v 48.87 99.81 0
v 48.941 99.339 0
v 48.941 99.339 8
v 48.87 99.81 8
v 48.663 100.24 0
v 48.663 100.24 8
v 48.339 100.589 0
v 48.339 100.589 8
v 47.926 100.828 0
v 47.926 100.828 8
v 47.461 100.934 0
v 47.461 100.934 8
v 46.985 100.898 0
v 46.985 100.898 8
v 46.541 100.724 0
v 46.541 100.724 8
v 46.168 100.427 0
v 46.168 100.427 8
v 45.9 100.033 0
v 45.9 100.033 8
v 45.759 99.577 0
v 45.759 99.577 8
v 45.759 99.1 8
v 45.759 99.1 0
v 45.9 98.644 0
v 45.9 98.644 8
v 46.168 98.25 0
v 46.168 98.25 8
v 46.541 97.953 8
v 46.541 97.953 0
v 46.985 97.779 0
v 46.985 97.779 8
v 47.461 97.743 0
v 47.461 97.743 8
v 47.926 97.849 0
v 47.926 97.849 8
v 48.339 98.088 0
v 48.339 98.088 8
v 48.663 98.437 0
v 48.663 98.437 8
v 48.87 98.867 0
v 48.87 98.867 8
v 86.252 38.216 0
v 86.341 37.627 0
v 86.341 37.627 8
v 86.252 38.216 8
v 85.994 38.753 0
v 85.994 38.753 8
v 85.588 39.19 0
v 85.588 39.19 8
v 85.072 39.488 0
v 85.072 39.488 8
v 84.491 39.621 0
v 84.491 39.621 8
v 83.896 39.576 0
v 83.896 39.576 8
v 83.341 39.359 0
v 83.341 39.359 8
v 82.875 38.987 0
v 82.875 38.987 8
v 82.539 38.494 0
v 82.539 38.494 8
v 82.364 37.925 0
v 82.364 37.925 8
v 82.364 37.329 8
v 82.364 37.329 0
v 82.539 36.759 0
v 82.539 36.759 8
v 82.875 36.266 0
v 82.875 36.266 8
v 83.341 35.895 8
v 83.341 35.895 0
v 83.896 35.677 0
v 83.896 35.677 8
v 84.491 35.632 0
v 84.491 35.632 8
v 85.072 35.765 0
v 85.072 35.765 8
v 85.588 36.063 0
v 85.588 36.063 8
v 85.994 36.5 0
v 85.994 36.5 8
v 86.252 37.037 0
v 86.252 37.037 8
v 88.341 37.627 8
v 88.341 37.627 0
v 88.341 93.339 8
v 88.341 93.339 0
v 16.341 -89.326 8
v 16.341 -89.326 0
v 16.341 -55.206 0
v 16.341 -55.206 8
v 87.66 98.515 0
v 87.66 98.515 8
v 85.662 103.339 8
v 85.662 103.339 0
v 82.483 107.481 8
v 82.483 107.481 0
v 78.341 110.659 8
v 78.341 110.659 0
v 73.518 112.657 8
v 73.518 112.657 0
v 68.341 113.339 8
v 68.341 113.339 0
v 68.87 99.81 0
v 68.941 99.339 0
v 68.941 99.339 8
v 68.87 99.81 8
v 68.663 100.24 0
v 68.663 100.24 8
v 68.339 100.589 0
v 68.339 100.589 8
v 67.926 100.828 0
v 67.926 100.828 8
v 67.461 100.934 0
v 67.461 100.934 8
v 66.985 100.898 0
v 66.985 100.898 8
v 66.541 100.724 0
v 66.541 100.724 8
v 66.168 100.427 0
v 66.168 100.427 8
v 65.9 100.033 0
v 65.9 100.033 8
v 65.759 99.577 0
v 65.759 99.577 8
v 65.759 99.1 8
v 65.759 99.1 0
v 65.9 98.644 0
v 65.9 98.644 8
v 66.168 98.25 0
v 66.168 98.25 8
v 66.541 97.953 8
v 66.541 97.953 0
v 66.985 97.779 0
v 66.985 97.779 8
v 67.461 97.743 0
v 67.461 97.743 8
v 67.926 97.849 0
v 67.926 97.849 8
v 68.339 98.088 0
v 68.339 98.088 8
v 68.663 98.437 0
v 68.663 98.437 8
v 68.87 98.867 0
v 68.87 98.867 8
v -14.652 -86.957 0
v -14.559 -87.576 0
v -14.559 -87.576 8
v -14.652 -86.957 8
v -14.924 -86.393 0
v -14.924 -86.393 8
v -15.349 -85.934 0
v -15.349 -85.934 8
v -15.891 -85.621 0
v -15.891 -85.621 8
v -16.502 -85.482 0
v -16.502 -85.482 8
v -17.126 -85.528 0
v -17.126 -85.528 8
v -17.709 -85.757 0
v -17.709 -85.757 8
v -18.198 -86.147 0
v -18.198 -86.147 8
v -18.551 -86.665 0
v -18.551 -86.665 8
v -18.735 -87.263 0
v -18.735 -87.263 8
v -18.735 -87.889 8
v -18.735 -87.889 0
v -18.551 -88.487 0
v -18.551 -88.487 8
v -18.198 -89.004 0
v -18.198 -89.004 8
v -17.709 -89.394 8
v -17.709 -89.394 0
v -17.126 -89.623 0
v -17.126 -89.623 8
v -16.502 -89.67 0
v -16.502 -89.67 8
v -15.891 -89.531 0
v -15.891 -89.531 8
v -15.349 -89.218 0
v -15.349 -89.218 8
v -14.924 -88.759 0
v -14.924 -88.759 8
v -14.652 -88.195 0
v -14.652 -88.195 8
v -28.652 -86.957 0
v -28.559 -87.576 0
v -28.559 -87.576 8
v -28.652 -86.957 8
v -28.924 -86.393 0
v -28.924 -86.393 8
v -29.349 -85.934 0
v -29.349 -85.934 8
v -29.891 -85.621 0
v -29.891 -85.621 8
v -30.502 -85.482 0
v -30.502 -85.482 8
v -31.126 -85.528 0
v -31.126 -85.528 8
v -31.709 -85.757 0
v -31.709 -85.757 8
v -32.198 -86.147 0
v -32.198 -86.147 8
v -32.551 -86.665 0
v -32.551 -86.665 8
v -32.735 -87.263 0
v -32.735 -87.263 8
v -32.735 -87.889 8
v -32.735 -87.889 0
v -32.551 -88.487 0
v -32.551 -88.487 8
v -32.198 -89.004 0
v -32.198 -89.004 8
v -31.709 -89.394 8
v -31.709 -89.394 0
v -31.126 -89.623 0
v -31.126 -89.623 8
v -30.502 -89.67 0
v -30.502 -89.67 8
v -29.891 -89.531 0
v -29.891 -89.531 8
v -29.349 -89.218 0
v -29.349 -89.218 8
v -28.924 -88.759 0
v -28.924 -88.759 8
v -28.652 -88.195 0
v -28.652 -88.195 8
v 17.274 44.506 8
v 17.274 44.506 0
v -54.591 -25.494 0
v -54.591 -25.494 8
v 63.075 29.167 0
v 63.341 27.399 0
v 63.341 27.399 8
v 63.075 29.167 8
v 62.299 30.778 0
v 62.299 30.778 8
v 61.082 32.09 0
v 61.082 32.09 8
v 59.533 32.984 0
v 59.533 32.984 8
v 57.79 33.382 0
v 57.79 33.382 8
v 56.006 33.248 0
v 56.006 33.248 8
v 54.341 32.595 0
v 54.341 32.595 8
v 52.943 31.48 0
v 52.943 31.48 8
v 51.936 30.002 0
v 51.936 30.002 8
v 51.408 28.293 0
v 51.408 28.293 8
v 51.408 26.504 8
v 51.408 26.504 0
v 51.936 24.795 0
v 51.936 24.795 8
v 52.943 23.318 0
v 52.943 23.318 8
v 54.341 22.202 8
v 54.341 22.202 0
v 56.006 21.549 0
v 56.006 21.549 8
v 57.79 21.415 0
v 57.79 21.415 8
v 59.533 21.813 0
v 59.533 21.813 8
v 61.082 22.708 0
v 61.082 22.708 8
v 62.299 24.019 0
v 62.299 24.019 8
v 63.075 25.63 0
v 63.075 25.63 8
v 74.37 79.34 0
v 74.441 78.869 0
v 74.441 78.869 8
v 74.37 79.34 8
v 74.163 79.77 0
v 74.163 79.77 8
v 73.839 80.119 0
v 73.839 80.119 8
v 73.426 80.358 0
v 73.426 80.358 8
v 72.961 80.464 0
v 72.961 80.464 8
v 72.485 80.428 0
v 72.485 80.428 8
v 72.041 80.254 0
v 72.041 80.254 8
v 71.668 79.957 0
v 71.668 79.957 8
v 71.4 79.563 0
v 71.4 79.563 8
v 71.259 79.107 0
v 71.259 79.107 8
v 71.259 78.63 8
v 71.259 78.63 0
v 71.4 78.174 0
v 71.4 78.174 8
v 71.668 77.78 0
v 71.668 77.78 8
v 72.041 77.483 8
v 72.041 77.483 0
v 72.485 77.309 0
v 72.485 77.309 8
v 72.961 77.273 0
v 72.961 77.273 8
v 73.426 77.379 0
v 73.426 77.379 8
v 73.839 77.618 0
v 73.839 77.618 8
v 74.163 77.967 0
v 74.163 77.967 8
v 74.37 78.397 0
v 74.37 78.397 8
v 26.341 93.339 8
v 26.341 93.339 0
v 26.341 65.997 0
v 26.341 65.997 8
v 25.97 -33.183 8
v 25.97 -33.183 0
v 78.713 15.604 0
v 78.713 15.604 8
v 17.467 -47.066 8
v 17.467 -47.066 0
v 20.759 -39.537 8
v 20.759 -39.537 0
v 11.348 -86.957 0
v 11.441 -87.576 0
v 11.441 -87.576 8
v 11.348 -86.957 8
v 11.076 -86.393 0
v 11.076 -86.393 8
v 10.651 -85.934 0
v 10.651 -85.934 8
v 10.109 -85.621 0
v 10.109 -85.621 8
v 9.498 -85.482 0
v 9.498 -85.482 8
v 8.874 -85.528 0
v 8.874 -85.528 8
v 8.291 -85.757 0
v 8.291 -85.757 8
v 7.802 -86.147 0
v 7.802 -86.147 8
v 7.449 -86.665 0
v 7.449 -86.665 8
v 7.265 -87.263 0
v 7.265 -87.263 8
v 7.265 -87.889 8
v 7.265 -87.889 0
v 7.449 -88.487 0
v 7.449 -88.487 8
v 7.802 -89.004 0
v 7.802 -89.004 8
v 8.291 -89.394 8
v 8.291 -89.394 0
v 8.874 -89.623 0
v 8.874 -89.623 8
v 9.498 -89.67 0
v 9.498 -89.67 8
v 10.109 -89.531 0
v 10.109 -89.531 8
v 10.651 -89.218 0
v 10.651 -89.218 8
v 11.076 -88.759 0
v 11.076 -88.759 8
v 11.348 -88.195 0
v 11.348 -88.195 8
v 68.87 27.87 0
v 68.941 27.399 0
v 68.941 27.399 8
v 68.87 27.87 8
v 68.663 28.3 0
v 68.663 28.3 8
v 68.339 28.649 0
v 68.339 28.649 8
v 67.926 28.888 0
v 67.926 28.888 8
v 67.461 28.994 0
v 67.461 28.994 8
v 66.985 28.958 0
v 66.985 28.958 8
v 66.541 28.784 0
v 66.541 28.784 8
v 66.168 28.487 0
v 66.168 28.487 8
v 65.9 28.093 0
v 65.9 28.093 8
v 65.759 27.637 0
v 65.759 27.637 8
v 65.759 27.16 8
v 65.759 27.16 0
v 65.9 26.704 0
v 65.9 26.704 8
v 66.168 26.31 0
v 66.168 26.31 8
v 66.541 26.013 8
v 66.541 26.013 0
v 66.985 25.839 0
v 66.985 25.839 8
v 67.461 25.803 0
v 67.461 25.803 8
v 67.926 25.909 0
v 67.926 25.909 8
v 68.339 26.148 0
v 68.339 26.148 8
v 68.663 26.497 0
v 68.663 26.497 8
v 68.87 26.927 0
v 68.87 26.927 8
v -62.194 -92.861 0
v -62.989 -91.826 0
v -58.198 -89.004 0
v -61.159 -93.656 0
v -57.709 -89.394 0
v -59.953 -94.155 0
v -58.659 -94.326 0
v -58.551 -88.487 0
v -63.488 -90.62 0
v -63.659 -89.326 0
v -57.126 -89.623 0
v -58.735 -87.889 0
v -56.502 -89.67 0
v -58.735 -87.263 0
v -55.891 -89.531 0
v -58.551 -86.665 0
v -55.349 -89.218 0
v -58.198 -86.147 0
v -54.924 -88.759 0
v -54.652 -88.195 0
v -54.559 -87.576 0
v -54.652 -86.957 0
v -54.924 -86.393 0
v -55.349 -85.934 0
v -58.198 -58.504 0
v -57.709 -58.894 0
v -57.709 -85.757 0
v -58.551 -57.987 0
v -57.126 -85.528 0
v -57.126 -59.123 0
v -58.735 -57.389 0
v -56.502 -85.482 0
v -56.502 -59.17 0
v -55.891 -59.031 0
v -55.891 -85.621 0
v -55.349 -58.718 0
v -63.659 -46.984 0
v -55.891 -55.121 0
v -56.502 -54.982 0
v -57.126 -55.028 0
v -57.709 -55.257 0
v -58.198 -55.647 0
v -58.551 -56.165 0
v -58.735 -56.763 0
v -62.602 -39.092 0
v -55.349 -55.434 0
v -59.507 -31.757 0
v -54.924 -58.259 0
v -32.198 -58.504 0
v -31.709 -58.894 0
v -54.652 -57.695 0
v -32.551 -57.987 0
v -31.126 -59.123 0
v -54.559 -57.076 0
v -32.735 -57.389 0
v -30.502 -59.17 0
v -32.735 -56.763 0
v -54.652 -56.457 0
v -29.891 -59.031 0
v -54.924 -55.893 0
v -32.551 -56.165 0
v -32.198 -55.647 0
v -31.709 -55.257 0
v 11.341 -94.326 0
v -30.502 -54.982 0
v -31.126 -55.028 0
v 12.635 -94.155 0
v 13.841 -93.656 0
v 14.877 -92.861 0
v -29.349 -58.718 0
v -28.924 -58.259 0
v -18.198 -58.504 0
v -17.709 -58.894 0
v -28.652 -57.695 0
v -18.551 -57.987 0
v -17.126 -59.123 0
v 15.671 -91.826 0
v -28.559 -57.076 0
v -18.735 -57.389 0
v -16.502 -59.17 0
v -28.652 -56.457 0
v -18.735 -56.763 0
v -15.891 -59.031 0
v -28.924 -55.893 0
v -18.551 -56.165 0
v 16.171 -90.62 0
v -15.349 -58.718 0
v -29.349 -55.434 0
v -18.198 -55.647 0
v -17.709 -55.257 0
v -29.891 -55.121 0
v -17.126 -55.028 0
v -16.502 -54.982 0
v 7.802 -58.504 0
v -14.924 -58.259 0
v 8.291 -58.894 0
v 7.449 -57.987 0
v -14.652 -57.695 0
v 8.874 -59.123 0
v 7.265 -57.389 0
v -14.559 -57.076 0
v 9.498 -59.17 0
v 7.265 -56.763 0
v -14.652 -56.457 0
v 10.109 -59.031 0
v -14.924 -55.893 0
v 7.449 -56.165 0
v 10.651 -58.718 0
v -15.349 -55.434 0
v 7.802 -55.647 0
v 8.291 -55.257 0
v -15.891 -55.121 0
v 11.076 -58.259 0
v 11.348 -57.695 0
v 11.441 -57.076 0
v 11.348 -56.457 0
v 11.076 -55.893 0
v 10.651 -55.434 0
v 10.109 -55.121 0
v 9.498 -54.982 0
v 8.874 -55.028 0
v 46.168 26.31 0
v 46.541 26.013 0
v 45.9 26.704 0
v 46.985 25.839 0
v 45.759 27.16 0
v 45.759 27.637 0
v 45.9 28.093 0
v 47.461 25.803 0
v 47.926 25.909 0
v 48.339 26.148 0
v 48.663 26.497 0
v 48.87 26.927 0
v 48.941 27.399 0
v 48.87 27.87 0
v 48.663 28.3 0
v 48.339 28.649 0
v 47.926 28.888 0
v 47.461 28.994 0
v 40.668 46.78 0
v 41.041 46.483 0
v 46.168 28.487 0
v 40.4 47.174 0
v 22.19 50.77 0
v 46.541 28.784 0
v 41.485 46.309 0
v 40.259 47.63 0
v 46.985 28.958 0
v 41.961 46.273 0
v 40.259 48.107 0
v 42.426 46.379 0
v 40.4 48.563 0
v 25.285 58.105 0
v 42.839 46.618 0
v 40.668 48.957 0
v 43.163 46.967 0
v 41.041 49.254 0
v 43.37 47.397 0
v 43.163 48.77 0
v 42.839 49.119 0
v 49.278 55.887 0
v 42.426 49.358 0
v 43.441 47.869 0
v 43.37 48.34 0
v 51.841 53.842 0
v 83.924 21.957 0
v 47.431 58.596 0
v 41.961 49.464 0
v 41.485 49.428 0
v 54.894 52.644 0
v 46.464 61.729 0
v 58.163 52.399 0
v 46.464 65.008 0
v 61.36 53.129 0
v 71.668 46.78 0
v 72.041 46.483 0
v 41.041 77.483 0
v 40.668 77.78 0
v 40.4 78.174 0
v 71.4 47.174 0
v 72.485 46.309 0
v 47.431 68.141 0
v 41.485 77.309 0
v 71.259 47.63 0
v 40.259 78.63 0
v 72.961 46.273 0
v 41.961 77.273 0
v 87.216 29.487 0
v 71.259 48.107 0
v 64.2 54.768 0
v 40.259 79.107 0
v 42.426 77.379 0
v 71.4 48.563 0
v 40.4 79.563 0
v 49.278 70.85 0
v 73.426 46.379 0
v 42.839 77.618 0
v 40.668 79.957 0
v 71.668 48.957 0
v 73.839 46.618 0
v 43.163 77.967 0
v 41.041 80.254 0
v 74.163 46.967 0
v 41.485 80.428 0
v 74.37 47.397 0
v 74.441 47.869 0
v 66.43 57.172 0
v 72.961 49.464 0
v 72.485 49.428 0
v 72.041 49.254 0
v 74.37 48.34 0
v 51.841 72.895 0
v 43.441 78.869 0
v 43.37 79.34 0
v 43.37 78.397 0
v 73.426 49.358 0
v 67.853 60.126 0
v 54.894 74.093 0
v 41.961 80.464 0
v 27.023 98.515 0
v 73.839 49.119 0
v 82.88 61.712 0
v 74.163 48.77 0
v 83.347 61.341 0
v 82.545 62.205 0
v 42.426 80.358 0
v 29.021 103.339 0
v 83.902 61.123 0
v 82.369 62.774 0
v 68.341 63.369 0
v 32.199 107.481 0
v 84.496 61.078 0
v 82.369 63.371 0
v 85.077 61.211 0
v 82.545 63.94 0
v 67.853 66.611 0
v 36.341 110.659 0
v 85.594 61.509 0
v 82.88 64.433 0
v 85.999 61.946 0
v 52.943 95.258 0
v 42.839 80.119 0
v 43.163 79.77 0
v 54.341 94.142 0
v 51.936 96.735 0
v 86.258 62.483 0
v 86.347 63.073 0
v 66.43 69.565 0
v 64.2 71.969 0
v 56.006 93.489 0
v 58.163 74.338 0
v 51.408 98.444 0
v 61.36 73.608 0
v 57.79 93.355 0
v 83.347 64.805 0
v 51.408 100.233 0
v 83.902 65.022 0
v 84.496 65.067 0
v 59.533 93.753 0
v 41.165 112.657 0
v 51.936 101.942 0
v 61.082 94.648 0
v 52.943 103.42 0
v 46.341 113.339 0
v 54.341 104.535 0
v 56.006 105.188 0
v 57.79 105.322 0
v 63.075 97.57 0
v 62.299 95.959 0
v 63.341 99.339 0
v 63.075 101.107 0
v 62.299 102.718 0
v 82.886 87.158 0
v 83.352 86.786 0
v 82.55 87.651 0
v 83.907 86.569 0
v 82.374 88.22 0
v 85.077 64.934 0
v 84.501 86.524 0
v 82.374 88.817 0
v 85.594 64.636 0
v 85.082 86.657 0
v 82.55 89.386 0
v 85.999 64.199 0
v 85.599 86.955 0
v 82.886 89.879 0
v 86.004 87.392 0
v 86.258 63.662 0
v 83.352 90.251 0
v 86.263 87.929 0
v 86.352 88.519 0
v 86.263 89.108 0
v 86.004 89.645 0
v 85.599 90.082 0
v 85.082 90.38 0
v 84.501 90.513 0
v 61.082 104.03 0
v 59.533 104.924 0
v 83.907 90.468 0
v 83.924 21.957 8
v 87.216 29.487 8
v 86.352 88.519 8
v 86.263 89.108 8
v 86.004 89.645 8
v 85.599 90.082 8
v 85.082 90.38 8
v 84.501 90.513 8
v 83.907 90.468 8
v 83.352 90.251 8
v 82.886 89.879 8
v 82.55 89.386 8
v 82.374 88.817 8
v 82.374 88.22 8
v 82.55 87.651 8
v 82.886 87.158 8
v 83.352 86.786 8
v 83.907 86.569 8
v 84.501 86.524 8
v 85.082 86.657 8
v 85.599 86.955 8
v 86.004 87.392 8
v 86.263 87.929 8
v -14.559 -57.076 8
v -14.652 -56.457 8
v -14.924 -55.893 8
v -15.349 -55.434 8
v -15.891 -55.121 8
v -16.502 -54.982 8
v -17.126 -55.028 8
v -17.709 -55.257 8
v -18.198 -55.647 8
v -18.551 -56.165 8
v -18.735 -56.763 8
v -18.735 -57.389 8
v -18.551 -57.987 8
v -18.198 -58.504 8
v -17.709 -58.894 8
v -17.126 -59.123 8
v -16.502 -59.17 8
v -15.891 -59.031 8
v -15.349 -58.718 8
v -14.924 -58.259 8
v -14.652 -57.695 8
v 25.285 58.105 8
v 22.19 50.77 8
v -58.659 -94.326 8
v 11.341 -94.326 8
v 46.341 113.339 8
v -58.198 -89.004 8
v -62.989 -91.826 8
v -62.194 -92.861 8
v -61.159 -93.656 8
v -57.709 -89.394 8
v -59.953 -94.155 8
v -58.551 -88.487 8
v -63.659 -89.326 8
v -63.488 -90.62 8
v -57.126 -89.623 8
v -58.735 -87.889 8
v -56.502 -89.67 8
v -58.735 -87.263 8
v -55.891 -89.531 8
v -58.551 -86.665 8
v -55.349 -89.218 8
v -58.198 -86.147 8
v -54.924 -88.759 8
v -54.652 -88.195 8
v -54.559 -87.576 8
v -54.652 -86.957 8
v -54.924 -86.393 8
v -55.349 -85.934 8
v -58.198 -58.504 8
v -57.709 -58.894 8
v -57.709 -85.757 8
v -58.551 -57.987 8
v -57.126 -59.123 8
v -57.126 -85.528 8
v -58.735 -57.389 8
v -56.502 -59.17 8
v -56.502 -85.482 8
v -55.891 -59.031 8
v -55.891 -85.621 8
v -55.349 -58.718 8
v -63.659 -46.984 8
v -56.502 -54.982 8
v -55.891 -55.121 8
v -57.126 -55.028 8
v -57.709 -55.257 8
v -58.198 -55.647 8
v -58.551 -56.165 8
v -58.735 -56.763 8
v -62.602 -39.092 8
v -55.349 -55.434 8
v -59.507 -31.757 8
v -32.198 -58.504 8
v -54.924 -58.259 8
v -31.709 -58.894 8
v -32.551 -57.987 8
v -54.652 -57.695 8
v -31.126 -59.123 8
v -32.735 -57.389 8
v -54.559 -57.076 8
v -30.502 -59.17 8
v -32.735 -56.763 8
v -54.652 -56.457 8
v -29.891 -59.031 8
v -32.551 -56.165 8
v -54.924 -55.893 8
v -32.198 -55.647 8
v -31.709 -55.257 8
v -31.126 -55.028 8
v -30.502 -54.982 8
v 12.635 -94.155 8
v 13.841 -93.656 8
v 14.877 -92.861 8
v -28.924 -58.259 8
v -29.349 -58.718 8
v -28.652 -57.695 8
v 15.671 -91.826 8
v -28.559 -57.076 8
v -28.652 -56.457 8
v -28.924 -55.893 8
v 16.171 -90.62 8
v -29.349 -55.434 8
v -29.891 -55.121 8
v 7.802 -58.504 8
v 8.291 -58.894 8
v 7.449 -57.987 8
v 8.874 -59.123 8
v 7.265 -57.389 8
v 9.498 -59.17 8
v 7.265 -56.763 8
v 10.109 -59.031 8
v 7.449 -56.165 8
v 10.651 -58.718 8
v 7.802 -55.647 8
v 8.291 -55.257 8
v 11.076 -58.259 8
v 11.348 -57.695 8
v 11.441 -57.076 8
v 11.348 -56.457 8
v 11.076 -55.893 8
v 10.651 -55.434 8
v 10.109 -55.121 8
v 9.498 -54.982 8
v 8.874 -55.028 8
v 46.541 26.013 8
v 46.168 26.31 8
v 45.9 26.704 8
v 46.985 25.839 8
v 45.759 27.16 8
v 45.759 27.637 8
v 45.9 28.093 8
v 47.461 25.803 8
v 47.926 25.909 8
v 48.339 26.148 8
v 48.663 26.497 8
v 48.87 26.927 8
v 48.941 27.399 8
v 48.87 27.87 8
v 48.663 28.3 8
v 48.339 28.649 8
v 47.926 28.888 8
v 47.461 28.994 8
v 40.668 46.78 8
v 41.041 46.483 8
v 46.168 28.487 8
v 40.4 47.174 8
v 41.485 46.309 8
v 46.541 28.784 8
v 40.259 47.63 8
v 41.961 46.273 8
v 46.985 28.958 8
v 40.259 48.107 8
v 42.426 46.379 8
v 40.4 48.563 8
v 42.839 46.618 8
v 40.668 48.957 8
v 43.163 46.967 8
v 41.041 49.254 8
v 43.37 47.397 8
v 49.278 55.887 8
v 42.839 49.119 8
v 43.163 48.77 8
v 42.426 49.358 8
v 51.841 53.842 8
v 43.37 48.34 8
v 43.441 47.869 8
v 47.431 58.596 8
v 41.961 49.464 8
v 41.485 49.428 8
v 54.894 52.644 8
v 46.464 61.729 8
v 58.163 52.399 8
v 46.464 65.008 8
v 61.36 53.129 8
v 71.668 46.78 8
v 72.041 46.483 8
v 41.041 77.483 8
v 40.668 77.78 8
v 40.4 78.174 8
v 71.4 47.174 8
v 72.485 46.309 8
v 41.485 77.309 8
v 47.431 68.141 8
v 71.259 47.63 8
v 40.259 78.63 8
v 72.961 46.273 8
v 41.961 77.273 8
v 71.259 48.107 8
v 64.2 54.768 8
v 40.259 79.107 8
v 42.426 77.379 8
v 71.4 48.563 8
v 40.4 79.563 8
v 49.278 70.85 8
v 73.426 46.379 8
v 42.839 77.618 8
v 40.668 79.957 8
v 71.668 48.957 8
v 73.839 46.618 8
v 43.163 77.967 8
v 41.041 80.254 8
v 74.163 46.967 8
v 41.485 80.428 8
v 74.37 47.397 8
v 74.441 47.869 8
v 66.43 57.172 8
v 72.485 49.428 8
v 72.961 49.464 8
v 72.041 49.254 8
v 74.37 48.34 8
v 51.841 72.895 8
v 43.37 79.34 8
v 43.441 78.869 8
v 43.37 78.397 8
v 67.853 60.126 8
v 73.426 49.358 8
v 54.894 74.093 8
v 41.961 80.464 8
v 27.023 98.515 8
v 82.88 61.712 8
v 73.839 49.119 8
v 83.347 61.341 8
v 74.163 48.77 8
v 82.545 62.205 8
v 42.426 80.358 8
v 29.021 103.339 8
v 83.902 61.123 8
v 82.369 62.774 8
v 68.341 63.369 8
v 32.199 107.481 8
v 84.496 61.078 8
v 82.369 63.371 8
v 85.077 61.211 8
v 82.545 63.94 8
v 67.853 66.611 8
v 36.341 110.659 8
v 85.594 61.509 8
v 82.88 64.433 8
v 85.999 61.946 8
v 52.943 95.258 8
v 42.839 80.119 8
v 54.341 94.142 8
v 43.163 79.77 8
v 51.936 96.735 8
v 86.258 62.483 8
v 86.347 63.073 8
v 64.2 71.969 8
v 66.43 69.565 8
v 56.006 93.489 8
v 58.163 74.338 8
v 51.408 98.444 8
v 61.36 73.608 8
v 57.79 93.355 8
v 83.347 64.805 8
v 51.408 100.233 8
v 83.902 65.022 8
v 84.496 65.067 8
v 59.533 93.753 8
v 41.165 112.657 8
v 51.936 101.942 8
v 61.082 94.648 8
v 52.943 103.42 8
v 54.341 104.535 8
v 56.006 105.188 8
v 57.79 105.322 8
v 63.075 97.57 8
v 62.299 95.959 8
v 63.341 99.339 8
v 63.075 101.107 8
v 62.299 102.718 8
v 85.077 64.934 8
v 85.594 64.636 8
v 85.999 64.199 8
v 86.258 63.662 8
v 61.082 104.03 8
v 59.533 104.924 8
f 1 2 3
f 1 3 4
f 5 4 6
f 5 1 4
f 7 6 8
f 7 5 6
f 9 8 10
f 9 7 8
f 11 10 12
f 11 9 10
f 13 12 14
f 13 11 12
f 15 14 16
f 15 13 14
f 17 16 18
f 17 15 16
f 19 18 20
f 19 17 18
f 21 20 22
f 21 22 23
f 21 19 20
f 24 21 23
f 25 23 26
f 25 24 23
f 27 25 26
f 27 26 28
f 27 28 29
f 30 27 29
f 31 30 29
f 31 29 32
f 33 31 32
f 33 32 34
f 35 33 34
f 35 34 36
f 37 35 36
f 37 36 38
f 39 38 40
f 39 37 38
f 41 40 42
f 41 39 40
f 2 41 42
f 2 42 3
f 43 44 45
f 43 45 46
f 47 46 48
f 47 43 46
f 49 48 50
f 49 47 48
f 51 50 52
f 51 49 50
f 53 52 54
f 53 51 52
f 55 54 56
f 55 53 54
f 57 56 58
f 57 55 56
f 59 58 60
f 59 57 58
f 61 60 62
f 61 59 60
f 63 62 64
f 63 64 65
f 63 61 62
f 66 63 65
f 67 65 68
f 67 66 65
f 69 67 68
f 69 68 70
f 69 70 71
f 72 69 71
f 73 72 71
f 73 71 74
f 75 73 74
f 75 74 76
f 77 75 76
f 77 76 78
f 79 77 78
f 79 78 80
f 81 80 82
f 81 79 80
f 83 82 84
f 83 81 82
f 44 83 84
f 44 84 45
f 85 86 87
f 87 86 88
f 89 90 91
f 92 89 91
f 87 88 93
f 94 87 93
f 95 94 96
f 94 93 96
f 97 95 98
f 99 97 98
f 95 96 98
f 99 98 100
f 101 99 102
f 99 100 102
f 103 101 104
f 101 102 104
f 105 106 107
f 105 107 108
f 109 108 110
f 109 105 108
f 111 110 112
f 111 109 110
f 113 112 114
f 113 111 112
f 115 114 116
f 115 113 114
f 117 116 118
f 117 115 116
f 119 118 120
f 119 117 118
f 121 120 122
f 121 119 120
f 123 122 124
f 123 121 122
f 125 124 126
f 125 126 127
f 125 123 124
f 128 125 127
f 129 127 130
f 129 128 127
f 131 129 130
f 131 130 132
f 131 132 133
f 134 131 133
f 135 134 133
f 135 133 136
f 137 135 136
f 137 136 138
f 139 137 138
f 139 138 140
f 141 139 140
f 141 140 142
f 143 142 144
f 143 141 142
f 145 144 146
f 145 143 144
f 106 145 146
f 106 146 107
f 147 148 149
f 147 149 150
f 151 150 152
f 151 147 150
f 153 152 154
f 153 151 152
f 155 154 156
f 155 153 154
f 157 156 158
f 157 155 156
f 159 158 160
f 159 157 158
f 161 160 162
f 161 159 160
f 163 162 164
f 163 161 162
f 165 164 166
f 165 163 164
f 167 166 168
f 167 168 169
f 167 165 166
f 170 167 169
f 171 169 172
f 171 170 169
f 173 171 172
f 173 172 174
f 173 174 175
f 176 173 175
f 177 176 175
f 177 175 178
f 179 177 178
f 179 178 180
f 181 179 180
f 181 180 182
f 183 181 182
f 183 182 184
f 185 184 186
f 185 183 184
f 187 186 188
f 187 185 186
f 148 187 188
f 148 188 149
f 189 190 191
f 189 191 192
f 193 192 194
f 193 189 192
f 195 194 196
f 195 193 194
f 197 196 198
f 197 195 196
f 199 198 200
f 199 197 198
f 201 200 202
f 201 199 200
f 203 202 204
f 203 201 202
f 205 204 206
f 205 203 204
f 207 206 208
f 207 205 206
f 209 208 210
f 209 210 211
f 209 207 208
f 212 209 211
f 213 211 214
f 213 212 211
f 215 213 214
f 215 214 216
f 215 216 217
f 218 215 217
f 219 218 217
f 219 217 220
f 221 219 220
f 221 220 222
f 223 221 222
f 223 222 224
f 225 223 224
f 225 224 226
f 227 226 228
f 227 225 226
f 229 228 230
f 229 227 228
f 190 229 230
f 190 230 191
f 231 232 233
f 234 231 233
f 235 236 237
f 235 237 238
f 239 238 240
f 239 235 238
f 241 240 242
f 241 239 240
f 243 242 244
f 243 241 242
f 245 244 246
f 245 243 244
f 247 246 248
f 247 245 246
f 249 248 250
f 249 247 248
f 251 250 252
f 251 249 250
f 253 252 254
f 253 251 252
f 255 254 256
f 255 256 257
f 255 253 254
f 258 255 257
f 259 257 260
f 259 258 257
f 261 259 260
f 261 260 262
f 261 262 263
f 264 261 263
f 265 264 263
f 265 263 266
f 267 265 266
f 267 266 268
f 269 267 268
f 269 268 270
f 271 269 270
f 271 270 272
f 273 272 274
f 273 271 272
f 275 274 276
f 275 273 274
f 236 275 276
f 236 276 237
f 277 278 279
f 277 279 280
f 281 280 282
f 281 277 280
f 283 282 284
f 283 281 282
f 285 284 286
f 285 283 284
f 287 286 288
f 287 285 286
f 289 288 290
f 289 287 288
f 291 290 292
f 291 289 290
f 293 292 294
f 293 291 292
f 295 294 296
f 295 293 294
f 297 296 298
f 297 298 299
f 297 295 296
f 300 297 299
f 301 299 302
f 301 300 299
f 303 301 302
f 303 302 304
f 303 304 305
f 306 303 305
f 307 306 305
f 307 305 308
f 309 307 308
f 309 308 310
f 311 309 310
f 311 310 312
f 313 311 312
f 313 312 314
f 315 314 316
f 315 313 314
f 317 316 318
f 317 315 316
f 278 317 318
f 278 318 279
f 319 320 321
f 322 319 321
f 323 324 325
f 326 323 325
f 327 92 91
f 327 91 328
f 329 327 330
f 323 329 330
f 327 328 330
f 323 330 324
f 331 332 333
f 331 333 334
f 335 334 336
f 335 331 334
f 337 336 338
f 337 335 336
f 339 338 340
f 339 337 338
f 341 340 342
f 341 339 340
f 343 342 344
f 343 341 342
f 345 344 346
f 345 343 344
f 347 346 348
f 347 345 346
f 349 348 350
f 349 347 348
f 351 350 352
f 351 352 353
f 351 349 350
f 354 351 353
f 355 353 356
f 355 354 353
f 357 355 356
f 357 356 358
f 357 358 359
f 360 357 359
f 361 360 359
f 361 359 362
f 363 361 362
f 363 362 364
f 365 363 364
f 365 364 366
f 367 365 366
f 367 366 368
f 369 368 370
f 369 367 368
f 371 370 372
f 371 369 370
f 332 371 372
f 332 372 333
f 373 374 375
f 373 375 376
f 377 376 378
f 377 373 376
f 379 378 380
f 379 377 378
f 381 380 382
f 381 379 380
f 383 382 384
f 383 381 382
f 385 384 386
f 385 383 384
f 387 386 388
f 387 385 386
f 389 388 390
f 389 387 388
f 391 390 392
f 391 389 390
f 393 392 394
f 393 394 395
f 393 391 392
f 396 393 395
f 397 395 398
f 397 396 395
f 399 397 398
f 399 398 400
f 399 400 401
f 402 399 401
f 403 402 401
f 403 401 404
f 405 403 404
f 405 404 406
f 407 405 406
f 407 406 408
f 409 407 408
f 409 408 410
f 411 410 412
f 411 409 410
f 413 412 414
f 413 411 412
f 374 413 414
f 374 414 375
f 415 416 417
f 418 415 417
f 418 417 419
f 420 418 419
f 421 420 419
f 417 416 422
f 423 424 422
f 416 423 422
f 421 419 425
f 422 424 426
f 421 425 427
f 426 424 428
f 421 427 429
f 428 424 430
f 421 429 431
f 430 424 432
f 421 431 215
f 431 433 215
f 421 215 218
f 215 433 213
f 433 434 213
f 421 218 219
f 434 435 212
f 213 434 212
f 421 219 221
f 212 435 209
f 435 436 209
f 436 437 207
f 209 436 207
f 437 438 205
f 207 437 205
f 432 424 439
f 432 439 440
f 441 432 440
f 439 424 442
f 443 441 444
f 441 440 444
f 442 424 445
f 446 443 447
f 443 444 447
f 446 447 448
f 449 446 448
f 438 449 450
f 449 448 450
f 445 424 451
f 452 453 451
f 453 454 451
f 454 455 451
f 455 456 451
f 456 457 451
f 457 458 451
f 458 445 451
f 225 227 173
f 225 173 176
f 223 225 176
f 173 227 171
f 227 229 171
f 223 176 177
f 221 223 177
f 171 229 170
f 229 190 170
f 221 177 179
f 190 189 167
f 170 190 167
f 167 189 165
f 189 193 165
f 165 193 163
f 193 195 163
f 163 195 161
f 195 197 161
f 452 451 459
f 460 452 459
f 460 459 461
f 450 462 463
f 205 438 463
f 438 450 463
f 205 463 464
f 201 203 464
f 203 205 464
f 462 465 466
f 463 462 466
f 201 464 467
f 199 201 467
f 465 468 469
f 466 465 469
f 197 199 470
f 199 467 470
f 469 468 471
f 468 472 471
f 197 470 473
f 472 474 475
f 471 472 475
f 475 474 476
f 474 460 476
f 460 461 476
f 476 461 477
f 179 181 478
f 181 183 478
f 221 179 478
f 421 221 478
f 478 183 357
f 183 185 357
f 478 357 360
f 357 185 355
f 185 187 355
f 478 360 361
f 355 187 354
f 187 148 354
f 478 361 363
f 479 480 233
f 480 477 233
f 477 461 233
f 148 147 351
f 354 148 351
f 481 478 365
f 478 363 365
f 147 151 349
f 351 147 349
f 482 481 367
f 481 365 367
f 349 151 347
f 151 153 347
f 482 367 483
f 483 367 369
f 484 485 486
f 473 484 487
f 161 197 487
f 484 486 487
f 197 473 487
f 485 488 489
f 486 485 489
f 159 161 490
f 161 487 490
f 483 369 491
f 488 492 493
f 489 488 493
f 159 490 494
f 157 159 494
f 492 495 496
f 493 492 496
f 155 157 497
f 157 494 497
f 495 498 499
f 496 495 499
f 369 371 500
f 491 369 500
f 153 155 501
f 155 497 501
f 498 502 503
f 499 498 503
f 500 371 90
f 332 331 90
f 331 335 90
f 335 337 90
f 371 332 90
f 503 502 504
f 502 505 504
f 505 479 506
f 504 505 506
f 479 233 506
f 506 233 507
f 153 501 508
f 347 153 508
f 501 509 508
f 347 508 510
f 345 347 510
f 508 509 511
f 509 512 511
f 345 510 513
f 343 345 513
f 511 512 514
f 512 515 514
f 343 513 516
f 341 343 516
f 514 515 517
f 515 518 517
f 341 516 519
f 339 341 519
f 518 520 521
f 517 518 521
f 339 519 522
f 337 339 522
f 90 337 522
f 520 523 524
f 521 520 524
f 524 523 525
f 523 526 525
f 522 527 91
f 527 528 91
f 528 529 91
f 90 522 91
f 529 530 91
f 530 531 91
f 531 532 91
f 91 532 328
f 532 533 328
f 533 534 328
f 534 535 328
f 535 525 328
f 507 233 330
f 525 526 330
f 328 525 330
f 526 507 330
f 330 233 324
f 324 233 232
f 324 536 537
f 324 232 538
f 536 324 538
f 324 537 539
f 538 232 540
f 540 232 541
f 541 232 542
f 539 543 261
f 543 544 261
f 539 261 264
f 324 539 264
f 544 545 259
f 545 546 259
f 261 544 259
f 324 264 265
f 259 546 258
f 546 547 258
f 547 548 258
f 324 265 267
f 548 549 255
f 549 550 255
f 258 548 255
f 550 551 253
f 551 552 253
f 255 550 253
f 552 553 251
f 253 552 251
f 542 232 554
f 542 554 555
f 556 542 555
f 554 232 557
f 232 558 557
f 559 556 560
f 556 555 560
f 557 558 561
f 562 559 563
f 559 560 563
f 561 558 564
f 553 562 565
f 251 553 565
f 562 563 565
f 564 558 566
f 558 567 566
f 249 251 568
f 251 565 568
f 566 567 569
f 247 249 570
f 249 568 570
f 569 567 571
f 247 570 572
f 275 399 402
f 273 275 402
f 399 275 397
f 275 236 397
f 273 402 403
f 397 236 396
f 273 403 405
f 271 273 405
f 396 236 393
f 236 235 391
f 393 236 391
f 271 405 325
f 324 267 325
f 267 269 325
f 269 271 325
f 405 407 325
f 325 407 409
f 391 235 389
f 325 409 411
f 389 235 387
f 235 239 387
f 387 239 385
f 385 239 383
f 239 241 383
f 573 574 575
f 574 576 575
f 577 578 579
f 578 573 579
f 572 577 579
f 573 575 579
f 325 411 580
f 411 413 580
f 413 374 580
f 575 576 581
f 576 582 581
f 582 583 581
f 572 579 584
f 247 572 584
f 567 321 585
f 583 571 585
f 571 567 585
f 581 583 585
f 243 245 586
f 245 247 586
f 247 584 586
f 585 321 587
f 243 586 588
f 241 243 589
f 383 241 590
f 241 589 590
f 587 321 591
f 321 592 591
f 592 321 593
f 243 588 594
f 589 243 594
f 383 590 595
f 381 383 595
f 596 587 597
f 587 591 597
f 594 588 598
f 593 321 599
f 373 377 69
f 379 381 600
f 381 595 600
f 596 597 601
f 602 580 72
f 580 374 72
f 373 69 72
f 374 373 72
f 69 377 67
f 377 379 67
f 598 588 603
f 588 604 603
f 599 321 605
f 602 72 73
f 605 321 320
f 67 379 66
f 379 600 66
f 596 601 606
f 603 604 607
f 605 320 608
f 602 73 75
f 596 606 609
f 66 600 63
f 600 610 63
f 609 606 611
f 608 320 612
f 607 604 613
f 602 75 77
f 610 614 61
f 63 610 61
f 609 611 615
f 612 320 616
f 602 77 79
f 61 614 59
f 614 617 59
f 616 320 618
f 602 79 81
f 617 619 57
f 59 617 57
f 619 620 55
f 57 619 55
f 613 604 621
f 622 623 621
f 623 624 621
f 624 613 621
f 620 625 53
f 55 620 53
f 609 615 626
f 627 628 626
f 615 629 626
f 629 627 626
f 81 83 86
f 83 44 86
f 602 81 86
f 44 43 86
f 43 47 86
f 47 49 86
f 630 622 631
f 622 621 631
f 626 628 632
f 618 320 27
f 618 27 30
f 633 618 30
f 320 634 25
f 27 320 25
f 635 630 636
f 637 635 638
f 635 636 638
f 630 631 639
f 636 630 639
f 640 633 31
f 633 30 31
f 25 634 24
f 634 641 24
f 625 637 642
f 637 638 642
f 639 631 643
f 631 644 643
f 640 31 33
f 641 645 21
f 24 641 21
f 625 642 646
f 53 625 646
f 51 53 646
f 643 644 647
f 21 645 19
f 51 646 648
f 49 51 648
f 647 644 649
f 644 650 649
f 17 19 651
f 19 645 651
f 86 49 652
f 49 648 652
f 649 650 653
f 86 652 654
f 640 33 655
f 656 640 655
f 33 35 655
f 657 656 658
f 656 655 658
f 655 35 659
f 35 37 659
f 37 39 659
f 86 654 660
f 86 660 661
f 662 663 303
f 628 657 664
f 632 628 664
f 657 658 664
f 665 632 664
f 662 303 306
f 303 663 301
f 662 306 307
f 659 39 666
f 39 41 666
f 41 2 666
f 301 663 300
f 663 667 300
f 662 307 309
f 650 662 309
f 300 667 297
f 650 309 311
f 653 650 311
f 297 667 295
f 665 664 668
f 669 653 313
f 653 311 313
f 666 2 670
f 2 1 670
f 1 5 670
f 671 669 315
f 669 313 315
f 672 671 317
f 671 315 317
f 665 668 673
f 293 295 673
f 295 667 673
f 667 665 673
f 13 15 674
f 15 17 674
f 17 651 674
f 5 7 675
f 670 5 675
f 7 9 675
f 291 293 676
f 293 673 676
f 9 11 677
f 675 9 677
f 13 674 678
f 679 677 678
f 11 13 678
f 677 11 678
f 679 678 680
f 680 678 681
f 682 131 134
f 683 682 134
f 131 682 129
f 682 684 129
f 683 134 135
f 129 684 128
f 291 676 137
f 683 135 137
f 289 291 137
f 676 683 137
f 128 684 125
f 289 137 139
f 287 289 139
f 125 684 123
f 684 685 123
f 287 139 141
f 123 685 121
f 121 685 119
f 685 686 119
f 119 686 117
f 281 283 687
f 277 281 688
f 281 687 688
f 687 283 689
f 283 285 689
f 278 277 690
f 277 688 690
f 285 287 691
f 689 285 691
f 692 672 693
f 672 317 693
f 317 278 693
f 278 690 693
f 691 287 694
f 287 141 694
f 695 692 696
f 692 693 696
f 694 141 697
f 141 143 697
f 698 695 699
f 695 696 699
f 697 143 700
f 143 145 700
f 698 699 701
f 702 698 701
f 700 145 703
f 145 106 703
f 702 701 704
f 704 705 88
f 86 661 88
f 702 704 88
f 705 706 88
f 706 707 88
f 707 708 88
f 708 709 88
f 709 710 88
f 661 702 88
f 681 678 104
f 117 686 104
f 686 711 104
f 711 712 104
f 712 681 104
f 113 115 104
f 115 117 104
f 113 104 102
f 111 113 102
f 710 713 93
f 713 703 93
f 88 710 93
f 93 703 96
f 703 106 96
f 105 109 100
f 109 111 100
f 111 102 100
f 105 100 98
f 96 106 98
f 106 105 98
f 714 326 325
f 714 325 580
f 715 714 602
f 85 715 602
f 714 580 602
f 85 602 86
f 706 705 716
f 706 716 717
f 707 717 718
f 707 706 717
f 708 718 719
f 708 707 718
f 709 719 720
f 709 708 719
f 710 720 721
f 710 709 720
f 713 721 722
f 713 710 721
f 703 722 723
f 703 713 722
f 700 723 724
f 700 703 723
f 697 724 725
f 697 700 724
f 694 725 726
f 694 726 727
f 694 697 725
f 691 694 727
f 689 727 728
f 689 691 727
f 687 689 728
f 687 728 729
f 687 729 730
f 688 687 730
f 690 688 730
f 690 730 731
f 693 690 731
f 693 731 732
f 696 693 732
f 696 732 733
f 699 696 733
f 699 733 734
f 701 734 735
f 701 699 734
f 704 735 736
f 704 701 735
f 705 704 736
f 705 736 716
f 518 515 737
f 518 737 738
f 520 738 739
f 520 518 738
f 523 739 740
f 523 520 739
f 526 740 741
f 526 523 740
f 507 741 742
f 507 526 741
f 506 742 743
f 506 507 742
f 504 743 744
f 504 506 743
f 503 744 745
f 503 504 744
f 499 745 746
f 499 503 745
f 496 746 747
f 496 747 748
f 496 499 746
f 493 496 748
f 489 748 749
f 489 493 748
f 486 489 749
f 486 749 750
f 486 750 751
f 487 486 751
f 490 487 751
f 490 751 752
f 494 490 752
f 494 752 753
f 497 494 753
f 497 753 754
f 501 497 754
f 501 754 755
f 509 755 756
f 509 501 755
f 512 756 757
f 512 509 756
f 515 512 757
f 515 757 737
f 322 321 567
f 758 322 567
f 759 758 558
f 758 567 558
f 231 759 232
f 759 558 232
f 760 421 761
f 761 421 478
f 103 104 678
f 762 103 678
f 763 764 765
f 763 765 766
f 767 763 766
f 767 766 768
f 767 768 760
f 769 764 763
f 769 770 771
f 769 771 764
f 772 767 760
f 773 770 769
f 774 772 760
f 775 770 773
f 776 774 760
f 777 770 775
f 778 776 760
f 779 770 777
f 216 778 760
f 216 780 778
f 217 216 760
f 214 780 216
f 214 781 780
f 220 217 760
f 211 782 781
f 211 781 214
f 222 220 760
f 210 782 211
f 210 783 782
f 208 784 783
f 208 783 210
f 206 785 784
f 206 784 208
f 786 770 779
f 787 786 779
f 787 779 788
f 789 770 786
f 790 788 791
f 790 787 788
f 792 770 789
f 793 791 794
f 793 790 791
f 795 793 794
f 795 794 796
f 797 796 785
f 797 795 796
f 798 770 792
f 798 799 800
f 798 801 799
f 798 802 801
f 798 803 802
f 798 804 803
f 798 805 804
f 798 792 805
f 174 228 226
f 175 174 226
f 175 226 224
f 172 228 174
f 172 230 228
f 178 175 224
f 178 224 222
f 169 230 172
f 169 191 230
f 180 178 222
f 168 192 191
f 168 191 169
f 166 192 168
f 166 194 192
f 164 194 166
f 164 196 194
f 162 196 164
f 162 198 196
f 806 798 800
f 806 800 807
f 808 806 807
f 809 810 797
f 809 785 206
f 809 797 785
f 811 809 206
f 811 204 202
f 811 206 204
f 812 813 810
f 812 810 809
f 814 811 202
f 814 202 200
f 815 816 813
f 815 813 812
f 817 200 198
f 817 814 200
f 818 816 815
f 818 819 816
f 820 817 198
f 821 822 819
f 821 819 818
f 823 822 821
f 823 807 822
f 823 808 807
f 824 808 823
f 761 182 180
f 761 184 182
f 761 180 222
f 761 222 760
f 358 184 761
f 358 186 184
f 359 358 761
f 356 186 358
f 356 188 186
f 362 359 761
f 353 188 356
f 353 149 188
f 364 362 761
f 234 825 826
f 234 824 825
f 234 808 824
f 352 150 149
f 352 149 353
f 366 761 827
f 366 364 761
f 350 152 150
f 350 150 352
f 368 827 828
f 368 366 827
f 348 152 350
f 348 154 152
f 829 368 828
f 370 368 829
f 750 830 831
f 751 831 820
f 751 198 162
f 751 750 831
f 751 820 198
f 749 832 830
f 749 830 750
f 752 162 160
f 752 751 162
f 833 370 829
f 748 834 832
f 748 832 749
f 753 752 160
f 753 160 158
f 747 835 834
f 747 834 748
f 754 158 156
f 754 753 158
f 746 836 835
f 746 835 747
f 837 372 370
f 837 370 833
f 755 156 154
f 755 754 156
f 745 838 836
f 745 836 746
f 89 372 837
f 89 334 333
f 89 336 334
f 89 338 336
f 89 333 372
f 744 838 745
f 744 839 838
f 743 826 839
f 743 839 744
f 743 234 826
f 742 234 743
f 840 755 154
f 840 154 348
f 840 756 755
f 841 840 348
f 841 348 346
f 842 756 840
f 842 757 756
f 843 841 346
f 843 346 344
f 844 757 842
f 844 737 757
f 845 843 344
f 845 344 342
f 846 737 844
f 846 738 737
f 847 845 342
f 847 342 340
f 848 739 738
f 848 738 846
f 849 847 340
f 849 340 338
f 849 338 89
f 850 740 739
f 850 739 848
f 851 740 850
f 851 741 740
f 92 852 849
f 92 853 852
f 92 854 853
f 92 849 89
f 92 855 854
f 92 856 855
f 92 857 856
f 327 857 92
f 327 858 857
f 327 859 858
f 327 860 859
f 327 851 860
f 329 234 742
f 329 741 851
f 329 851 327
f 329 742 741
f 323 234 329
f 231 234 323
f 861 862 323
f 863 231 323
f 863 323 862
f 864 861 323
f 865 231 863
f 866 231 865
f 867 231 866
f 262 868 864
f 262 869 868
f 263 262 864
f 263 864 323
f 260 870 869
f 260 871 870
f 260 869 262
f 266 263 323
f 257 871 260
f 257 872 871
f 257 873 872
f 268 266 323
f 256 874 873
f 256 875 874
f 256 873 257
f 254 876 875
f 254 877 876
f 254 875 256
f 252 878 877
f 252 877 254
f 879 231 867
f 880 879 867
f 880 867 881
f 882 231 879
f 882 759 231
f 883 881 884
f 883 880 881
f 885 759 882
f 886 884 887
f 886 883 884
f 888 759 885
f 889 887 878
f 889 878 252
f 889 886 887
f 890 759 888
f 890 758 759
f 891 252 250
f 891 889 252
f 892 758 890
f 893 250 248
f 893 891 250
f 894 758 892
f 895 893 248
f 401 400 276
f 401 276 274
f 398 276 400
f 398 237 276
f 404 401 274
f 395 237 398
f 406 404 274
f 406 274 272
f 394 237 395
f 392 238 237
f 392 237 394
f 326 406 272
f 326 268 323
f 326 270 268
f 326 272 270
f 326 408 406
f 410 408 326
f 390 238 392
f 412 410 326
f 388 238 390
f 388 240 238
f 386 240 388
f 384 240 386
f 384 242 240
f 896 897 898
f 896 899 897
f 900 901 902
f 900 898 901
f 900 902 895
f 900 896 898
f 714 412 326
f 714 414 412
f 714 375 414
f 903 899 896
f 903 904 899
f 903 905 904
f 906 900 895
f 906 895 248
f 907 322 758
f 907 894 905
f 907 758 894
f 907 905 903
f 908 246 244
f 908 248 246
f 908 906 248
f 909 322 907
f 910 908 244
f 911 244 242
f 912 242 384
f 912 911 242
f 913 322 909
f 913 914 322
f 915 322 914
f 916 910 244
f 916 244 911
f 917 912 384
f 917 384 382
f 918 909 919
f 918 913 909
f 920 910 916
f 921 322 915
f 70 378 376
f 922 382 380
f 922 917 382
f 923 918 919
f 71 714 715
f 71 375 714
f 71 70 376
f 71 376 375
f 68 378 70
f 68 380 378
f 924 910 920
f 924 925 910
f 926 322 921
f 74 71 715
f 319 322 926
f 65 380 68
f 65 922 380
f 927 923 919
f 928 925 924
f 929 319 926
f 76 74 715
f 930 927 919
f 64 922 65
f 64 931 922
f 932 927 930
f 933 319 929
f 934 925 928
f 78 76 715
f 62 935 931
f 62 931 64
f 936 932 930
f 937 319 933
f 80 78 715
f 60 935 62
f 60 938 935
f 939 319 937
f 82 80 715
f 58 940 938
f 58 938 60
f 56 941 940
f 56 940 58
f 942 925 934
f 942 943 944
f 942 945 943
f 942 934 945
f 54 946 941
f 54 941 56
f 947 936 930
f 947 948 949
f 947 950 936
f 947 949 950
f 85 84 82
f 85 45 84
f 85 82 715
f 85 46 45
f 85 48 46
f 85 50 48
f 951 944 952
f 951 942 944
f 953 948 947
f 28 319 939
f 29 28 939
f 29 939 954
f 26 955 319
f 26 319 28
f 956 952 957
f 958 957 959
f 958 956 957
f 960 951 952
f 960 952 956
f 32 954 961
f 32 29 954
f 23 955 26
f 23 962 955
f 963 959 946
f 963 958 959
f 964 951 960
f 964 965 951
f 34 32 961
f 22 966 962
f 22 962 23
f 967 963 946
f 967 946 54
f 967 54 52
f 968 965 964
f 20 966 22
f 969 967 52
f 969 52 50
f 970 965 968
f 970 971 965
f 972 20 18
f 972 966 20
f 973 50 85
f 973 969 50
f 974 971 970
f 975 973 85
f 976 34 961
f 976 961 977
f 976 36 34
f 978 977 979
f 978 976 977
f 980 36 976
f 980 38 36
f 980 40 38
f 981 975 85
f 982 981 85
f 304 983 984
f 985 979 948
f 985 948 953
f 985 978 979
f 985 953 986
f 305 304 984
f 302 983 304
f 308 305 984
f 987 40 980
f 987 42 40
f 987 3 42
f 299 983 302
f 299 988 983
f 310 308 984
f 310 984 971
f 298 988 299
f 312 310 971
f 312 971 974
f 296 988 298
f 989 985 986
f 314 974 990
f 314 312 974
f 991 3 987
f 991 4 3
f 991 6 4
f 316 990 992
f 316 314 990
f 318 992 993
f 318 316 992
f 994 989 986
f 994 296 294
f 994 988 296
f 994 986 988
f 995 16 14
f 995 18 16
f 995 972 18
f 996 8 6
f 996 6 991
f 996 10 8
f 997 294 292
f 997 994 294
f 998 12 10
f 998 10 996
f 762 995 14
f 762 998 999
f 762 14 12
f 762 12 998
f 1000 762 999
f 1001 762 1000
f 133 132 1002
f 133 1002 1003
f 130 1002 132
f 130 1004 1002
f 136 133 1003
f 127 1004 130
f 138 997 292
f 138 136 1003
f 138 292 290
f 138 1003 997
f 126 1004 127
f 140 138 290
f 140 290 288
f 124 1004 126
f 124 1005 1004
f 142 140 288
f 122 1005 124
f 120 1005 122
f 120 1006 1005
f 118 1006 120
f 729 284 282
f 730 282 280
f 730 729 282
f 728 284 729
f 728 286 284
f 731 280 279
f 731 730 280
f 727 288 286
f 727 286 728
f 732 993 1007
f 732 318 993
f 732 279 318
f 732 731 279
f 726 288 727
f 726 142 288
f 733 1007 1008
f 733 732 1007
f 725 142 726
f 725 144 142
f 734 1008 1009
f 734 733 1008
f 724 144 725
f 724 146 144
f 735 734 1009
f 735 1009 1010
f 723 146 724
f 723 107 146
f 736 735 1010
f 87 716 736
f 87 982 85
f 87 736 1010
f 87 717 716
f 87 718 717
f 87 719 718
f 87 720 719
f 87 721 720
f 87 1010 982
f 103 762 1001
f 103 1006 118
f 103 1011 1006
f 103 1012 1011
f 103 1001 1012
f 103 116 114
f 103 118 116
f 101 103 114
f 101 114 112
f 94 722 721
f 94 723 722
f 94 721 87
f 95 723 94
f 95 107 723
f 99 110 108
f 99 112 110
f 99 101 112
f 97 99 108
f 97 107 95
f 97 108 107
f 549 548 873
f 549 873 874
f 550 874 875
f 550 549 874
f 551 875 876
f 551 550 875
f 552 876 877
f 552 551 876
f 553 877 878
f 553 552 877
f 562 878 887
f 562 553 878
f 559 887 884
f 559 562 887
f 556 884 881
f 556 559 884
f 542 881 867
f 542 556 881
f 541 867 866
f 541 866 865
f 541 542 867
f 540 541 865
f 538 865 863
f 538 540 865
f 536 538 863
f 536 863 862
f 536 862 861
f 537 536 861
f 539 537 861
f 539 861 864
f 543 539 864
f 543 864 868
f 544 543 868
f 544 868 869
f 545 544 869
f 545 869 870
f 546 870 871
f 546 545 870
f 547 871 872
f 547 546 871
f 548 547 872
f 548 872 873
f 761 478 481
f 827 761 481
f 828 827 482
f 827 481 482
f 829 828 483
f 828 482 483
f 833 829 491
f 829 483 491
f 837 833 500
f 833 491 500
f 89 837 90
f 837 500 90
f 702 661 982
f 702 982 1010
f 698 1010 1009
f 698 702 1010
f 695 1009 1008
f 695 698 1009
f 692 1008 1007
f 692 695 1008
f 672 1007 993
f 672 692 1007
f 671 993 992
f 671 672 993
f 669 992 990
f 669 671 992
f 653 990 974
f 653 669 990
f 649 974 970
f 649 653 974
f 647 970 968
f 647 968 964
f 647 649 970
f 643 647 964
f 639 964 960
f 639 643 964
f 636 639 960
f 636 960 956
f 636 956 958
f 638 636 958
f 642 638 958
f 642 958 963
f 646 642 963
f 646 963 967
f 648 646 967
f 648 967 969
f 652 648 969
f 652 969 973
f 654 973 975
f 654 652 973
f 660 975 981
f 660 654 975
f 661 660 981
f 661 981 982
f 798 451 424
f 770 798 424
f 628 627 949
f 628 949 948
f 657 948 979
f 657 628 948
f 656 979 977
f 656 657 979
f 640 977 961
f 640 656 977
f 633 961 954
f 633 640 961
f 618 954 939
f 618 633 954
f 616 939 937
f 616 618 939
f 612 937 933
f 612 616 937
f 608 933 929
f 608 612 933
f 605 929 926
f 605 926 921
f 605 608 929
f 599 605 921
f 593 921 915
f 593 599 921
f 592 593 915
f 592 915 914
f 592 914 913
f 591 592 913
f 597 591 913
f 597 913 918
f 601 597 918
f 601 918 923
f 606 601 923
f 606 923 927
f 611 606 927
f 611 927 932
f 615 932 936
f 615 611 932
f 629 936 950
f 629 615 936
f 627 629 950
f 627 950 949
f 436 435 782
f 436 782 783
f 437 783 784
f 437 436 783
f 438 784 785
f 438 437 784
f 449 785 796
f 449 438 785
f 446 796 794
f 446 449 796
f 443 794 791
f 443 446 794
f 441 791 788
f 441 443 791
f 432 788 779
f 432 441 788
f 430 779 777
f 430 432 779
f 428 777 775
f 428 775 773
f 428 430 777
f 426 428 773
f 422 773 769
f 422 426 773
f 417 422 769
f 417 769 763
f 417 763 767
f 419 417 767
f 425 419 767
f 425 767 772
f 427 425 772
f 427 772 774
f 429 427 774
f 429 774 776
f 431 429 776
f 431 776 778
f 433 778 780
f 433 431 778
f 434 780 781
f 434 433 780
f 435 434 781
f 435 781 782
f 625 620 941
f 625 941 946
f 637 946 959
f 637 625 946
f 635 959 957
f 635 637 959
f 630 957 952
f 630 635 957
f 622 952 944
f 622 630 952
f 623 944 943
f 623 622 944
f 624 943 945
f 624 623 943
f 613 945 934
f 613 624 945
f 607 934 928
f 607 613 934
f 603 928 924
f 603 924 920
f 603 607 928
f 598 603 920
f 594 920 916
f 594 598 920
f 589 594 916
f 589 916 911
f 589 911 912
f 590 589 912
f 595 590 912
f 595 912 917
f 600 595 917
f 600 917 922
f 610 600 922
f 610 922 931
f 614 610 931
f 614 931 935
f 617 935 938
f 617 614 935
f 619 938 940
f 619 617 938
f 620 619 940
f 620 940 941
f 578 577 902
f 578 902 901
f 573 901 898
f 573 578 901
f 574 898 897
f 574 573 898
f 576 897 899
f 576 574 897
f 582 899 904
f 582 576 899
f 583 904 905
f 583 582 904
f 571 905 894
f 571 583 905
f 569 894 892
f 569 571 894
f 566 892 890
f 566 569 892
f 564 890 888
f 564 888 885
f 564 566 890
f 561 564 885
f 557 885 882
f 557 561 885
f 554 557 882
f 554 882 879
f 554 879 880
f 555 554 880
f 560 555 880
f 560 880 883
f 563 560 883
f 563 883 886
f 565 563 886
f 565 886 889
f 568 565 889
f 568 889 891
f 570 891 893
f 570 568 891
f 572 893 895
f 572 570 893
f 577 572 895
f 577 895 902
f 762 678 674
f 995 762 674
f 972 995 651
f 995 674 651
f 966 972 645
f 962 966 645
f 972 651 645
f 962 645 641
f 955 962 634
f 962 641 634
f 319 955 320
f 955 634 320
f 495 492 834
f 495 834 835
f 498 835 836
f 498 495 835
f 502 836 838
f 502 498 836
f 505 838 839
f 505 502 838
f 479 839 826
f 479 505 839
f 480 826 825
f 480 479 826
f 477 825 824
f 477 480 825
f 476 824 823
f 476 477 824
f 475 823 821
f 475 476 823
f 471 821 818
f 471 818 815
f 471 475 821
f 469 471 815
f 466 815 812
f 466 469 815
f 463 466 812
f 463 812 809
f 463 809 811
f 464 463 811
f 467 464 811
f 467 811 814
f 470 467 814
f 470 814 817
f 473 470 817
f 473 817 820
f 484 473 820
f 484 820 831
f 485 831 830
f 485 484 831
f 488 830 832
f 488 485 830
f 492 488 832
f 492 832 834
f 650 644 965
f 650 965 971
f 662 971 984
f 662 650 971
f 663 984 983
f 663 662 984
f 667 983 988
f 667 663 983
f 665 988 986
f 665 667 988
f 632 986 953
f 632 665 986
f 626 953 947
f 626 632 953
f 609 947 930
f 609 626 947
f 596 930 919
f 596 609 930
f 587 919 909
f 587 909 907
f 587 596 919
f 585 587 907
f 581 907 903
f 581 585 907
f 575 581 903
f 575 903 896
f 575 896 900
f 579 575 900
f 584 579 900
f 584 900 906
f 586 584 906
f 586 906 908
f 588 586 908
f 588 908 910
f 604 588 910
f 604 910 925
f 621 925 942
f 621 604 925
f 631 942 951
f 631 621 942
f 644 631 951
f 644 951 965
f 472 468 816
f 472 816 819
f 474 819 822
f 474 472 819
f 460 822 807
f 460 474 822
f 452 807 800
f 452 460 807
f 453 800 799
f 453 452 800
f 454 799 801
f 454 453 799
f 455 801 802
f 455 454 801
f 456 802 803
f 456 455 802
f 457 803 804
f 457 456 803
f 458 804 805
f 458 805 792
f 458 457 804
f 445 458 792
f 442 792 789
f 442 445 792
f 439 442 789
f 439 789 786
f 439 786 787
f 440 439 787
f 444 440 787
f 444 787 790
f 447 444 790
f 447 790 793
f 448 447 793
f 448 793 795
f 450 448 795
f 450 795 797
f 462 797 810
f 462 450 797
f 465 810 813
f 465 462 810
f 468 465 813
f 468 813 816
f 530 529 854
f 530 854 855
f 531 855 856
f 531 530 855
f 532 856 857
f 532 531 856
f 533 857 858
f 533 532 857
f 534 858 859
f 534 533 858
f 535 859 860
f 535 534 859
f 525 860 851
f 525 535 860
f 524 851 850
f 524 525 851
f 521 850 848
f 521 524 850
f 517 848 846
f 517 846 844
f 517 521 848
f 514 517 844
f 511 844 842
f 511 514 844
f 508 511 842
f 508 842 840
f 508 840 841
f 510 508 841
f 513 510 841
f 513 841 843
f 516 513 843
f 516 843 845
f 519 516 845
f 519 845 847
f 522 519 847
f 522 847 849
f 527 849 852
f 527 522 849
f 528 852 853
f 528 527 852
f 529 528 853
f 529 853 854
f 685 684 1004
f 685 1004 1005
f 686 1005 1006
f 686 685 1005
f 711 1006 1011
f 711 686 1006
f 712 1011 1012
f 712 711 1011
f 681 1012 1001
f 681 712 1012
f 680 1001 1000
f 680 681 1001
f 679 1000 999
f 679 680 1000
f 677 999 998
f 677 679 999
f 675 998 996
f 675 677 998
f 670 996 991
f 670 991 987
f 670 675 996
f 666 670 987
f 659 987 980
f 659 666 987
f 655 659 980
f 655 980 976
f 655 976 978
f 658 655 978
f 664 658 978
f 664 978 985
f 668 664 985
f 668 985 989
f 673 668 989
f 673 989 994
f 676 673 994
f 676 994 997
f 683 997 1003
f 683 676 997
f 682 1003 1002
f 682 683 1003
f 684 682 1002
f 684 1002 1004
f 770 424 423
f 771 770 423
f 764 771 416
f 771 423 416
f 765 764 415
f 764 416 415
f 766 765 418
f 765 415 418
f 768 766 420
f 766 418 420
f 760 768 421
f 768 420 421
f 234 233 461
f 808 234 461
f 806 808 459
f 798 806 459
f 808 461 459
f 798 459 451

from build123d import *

# Parameters (mm, degrees)
SKETCH1_R           = 2.1
SKETCH1_R_2         = 6
SKETCH1_R_3         = 11
SKETCH1_R_4         = 1.6
SKETCH1_R_5         = 2
BOSS_EXTRUDE1_DEPTH = 8


with BuildPart() as part:
    # Sketch1 → Boss-Extrude1 (new body)
    with BuildSketch(Plane.XY):
        with BuildLine():
            Line((-58.658661762, -94.325772402), (11.341338238, -94.325772402))
            ThreePointArc((11.341338238, -94.325772402), (14.876872144, -92.861306308), (16.341338238, -89.325772402))
            Line((16.341338238, -89.325772402), (16.341338238, -55.206132823))
            ThreePointArc((16.341338238, -55.206132823), (18.853727353, -43.188177597), (25.970088092, -33.18314103))
            Line((25.970088092, -33.18314103), (78.712588384, 15.603630397))
            ThreePointArc((78.712588384, 15.603630397), (85.828949123, 25.608666964), (88.341338238, 37.62662219))
            Line((88.341338238, 37.62662219), (88.341338238, 93.338561628))
            ThreePointArc((88.341338238, 93.338561628), (82.483473862, 107.480697252), (68.341338238, 113.338561628))
            Line((68.341338238, 113.338561628), (46.341338238, 113.338561628))
            ThreePointArc((46.341338238, 113.338561628), (32.199202614, 107.480697252), (26.341338238, 93.338561628))
            Line((26.341338238, 93.338561628), (26.341338238, 65.996620638))
            ThreePointArc((26.341338238, 65.996620638), (23.98166612, 54.334190592), (17.273853267, 44.506394613))
            Line((17.273853267, 44.506394613), (-54.591176791, -25.493605387))
            ThreePointArc((-54.591176791, -25.493605387), (-61.298989644, -35.321401365), (-63.658661762, -46.983831411))
            Line((-63.658661762, -46.983831411), (-63.658661762, -89.325772402))
            ThreePointArc((-63.658661762, -89.325772402), (-62.194195668, -92.861306308), (-58.658661762, -94.325772402))
        make_face()
        with Locations((-56.658661762, -57.075772402)):
            Circle(SKETCH1_R, mode=Mode.SUBTRACT)
        with Locations((-30.658661762, -57.075772402)):
            Circle(SKETCH1_R, mode=Mode.SUBTRACT)
        with Locations((-30.658661762, -87.575772402)):
            Circle(SKETCH1_R, mode=Mode.SUBTRACT)
        with Locations((-56.658661762, -87.575772402)):
            Circle(SKETCH1_R, mode=Mode.SUBTRACT)
        with Locations((9.341338238, -87.575772402)):
            Circle(SKETCH1_R, mode=Mode.SUBTRACT)
        with Locations((-16.658661762, -87.575772402)):
            Circle(SKETCH1_R, mode=Mode.SUBTRACT)
        with Locations((-16.658661762, -57.075772402)):
            Circle(SKETCH1_R, mode=Mode.SUBTRACT)
        with Locations((9.341338238, -57.075772402)):
            Circle(SKETCH1_R, mode=Mode.SUBTRACT)
        with Locations((57.341338238, 99.338561628)):
            Circle(SKETCH1_R_2, mode=Mode.SUBTRACT)
        with Locations((57.341338238, 27.398561628)):
            Circle(SKETCH1_R_2, mode=Mode.SUBTRACT)
        with Locations((57.341338238, 63.368561628)):
            Circle(SKETCH1_R_3, mode=Mode.SUBTRACT)
        with Locations((41.841338238, 78.868561628)):
            Circle(SKETCH1_R_4, mode=Mode.SUBTRACT)
        with Locations((72.841338238, 78.868561628)):
            Circle(SKETCH1_R_4, mode=Mode.SUBTRACT)
        with Locations((72.841338238, 47.868561628)):
            Circle(SKETCH1_R_4, mode=Mode.SUBTRACT)
        with Locations((41.841338238, 47.868561628)):
            Circle(SKETCH1_R_4, mode=Mode.SUBTRACT)
        with Locations((84.341338238, 37.62662219)):
            Circle(SKETCH1_R_5, mode=Mode.SUBTRACT)
        with Locations((84.351781192, 88.518513838)):
            Circle(SKETCH1_R_5, mode=Mode.SUBTRACT)
        with Locations((47.341338238, 99.338561628)):
            Circle(SKETCH1_R_4, mode=Mode.SUBTRACT)
        with Locations((47.341338238, 27.398561628)):
            Circle(SKETCH1_R_4, mode=Mode.SUBTRACT)
        with Locations((67.341338238, 99.338561628)):
            Circle(SKETCH1_R_4, mode=Mode.SUBTRACT)
        with Locations((67.341338238, 27.398561628)):
            Circle(SKETCH1_R_4, mode=Mode.SUBTRACT)
        with Locations((84.346559715, 63.072568014)):
            Circle(SKETCH1_R_5, mode=Mode.SUBTRACT)
    extrude(amount=BOSS_EXTRUDE1_DEPTH)


solid = part.part
